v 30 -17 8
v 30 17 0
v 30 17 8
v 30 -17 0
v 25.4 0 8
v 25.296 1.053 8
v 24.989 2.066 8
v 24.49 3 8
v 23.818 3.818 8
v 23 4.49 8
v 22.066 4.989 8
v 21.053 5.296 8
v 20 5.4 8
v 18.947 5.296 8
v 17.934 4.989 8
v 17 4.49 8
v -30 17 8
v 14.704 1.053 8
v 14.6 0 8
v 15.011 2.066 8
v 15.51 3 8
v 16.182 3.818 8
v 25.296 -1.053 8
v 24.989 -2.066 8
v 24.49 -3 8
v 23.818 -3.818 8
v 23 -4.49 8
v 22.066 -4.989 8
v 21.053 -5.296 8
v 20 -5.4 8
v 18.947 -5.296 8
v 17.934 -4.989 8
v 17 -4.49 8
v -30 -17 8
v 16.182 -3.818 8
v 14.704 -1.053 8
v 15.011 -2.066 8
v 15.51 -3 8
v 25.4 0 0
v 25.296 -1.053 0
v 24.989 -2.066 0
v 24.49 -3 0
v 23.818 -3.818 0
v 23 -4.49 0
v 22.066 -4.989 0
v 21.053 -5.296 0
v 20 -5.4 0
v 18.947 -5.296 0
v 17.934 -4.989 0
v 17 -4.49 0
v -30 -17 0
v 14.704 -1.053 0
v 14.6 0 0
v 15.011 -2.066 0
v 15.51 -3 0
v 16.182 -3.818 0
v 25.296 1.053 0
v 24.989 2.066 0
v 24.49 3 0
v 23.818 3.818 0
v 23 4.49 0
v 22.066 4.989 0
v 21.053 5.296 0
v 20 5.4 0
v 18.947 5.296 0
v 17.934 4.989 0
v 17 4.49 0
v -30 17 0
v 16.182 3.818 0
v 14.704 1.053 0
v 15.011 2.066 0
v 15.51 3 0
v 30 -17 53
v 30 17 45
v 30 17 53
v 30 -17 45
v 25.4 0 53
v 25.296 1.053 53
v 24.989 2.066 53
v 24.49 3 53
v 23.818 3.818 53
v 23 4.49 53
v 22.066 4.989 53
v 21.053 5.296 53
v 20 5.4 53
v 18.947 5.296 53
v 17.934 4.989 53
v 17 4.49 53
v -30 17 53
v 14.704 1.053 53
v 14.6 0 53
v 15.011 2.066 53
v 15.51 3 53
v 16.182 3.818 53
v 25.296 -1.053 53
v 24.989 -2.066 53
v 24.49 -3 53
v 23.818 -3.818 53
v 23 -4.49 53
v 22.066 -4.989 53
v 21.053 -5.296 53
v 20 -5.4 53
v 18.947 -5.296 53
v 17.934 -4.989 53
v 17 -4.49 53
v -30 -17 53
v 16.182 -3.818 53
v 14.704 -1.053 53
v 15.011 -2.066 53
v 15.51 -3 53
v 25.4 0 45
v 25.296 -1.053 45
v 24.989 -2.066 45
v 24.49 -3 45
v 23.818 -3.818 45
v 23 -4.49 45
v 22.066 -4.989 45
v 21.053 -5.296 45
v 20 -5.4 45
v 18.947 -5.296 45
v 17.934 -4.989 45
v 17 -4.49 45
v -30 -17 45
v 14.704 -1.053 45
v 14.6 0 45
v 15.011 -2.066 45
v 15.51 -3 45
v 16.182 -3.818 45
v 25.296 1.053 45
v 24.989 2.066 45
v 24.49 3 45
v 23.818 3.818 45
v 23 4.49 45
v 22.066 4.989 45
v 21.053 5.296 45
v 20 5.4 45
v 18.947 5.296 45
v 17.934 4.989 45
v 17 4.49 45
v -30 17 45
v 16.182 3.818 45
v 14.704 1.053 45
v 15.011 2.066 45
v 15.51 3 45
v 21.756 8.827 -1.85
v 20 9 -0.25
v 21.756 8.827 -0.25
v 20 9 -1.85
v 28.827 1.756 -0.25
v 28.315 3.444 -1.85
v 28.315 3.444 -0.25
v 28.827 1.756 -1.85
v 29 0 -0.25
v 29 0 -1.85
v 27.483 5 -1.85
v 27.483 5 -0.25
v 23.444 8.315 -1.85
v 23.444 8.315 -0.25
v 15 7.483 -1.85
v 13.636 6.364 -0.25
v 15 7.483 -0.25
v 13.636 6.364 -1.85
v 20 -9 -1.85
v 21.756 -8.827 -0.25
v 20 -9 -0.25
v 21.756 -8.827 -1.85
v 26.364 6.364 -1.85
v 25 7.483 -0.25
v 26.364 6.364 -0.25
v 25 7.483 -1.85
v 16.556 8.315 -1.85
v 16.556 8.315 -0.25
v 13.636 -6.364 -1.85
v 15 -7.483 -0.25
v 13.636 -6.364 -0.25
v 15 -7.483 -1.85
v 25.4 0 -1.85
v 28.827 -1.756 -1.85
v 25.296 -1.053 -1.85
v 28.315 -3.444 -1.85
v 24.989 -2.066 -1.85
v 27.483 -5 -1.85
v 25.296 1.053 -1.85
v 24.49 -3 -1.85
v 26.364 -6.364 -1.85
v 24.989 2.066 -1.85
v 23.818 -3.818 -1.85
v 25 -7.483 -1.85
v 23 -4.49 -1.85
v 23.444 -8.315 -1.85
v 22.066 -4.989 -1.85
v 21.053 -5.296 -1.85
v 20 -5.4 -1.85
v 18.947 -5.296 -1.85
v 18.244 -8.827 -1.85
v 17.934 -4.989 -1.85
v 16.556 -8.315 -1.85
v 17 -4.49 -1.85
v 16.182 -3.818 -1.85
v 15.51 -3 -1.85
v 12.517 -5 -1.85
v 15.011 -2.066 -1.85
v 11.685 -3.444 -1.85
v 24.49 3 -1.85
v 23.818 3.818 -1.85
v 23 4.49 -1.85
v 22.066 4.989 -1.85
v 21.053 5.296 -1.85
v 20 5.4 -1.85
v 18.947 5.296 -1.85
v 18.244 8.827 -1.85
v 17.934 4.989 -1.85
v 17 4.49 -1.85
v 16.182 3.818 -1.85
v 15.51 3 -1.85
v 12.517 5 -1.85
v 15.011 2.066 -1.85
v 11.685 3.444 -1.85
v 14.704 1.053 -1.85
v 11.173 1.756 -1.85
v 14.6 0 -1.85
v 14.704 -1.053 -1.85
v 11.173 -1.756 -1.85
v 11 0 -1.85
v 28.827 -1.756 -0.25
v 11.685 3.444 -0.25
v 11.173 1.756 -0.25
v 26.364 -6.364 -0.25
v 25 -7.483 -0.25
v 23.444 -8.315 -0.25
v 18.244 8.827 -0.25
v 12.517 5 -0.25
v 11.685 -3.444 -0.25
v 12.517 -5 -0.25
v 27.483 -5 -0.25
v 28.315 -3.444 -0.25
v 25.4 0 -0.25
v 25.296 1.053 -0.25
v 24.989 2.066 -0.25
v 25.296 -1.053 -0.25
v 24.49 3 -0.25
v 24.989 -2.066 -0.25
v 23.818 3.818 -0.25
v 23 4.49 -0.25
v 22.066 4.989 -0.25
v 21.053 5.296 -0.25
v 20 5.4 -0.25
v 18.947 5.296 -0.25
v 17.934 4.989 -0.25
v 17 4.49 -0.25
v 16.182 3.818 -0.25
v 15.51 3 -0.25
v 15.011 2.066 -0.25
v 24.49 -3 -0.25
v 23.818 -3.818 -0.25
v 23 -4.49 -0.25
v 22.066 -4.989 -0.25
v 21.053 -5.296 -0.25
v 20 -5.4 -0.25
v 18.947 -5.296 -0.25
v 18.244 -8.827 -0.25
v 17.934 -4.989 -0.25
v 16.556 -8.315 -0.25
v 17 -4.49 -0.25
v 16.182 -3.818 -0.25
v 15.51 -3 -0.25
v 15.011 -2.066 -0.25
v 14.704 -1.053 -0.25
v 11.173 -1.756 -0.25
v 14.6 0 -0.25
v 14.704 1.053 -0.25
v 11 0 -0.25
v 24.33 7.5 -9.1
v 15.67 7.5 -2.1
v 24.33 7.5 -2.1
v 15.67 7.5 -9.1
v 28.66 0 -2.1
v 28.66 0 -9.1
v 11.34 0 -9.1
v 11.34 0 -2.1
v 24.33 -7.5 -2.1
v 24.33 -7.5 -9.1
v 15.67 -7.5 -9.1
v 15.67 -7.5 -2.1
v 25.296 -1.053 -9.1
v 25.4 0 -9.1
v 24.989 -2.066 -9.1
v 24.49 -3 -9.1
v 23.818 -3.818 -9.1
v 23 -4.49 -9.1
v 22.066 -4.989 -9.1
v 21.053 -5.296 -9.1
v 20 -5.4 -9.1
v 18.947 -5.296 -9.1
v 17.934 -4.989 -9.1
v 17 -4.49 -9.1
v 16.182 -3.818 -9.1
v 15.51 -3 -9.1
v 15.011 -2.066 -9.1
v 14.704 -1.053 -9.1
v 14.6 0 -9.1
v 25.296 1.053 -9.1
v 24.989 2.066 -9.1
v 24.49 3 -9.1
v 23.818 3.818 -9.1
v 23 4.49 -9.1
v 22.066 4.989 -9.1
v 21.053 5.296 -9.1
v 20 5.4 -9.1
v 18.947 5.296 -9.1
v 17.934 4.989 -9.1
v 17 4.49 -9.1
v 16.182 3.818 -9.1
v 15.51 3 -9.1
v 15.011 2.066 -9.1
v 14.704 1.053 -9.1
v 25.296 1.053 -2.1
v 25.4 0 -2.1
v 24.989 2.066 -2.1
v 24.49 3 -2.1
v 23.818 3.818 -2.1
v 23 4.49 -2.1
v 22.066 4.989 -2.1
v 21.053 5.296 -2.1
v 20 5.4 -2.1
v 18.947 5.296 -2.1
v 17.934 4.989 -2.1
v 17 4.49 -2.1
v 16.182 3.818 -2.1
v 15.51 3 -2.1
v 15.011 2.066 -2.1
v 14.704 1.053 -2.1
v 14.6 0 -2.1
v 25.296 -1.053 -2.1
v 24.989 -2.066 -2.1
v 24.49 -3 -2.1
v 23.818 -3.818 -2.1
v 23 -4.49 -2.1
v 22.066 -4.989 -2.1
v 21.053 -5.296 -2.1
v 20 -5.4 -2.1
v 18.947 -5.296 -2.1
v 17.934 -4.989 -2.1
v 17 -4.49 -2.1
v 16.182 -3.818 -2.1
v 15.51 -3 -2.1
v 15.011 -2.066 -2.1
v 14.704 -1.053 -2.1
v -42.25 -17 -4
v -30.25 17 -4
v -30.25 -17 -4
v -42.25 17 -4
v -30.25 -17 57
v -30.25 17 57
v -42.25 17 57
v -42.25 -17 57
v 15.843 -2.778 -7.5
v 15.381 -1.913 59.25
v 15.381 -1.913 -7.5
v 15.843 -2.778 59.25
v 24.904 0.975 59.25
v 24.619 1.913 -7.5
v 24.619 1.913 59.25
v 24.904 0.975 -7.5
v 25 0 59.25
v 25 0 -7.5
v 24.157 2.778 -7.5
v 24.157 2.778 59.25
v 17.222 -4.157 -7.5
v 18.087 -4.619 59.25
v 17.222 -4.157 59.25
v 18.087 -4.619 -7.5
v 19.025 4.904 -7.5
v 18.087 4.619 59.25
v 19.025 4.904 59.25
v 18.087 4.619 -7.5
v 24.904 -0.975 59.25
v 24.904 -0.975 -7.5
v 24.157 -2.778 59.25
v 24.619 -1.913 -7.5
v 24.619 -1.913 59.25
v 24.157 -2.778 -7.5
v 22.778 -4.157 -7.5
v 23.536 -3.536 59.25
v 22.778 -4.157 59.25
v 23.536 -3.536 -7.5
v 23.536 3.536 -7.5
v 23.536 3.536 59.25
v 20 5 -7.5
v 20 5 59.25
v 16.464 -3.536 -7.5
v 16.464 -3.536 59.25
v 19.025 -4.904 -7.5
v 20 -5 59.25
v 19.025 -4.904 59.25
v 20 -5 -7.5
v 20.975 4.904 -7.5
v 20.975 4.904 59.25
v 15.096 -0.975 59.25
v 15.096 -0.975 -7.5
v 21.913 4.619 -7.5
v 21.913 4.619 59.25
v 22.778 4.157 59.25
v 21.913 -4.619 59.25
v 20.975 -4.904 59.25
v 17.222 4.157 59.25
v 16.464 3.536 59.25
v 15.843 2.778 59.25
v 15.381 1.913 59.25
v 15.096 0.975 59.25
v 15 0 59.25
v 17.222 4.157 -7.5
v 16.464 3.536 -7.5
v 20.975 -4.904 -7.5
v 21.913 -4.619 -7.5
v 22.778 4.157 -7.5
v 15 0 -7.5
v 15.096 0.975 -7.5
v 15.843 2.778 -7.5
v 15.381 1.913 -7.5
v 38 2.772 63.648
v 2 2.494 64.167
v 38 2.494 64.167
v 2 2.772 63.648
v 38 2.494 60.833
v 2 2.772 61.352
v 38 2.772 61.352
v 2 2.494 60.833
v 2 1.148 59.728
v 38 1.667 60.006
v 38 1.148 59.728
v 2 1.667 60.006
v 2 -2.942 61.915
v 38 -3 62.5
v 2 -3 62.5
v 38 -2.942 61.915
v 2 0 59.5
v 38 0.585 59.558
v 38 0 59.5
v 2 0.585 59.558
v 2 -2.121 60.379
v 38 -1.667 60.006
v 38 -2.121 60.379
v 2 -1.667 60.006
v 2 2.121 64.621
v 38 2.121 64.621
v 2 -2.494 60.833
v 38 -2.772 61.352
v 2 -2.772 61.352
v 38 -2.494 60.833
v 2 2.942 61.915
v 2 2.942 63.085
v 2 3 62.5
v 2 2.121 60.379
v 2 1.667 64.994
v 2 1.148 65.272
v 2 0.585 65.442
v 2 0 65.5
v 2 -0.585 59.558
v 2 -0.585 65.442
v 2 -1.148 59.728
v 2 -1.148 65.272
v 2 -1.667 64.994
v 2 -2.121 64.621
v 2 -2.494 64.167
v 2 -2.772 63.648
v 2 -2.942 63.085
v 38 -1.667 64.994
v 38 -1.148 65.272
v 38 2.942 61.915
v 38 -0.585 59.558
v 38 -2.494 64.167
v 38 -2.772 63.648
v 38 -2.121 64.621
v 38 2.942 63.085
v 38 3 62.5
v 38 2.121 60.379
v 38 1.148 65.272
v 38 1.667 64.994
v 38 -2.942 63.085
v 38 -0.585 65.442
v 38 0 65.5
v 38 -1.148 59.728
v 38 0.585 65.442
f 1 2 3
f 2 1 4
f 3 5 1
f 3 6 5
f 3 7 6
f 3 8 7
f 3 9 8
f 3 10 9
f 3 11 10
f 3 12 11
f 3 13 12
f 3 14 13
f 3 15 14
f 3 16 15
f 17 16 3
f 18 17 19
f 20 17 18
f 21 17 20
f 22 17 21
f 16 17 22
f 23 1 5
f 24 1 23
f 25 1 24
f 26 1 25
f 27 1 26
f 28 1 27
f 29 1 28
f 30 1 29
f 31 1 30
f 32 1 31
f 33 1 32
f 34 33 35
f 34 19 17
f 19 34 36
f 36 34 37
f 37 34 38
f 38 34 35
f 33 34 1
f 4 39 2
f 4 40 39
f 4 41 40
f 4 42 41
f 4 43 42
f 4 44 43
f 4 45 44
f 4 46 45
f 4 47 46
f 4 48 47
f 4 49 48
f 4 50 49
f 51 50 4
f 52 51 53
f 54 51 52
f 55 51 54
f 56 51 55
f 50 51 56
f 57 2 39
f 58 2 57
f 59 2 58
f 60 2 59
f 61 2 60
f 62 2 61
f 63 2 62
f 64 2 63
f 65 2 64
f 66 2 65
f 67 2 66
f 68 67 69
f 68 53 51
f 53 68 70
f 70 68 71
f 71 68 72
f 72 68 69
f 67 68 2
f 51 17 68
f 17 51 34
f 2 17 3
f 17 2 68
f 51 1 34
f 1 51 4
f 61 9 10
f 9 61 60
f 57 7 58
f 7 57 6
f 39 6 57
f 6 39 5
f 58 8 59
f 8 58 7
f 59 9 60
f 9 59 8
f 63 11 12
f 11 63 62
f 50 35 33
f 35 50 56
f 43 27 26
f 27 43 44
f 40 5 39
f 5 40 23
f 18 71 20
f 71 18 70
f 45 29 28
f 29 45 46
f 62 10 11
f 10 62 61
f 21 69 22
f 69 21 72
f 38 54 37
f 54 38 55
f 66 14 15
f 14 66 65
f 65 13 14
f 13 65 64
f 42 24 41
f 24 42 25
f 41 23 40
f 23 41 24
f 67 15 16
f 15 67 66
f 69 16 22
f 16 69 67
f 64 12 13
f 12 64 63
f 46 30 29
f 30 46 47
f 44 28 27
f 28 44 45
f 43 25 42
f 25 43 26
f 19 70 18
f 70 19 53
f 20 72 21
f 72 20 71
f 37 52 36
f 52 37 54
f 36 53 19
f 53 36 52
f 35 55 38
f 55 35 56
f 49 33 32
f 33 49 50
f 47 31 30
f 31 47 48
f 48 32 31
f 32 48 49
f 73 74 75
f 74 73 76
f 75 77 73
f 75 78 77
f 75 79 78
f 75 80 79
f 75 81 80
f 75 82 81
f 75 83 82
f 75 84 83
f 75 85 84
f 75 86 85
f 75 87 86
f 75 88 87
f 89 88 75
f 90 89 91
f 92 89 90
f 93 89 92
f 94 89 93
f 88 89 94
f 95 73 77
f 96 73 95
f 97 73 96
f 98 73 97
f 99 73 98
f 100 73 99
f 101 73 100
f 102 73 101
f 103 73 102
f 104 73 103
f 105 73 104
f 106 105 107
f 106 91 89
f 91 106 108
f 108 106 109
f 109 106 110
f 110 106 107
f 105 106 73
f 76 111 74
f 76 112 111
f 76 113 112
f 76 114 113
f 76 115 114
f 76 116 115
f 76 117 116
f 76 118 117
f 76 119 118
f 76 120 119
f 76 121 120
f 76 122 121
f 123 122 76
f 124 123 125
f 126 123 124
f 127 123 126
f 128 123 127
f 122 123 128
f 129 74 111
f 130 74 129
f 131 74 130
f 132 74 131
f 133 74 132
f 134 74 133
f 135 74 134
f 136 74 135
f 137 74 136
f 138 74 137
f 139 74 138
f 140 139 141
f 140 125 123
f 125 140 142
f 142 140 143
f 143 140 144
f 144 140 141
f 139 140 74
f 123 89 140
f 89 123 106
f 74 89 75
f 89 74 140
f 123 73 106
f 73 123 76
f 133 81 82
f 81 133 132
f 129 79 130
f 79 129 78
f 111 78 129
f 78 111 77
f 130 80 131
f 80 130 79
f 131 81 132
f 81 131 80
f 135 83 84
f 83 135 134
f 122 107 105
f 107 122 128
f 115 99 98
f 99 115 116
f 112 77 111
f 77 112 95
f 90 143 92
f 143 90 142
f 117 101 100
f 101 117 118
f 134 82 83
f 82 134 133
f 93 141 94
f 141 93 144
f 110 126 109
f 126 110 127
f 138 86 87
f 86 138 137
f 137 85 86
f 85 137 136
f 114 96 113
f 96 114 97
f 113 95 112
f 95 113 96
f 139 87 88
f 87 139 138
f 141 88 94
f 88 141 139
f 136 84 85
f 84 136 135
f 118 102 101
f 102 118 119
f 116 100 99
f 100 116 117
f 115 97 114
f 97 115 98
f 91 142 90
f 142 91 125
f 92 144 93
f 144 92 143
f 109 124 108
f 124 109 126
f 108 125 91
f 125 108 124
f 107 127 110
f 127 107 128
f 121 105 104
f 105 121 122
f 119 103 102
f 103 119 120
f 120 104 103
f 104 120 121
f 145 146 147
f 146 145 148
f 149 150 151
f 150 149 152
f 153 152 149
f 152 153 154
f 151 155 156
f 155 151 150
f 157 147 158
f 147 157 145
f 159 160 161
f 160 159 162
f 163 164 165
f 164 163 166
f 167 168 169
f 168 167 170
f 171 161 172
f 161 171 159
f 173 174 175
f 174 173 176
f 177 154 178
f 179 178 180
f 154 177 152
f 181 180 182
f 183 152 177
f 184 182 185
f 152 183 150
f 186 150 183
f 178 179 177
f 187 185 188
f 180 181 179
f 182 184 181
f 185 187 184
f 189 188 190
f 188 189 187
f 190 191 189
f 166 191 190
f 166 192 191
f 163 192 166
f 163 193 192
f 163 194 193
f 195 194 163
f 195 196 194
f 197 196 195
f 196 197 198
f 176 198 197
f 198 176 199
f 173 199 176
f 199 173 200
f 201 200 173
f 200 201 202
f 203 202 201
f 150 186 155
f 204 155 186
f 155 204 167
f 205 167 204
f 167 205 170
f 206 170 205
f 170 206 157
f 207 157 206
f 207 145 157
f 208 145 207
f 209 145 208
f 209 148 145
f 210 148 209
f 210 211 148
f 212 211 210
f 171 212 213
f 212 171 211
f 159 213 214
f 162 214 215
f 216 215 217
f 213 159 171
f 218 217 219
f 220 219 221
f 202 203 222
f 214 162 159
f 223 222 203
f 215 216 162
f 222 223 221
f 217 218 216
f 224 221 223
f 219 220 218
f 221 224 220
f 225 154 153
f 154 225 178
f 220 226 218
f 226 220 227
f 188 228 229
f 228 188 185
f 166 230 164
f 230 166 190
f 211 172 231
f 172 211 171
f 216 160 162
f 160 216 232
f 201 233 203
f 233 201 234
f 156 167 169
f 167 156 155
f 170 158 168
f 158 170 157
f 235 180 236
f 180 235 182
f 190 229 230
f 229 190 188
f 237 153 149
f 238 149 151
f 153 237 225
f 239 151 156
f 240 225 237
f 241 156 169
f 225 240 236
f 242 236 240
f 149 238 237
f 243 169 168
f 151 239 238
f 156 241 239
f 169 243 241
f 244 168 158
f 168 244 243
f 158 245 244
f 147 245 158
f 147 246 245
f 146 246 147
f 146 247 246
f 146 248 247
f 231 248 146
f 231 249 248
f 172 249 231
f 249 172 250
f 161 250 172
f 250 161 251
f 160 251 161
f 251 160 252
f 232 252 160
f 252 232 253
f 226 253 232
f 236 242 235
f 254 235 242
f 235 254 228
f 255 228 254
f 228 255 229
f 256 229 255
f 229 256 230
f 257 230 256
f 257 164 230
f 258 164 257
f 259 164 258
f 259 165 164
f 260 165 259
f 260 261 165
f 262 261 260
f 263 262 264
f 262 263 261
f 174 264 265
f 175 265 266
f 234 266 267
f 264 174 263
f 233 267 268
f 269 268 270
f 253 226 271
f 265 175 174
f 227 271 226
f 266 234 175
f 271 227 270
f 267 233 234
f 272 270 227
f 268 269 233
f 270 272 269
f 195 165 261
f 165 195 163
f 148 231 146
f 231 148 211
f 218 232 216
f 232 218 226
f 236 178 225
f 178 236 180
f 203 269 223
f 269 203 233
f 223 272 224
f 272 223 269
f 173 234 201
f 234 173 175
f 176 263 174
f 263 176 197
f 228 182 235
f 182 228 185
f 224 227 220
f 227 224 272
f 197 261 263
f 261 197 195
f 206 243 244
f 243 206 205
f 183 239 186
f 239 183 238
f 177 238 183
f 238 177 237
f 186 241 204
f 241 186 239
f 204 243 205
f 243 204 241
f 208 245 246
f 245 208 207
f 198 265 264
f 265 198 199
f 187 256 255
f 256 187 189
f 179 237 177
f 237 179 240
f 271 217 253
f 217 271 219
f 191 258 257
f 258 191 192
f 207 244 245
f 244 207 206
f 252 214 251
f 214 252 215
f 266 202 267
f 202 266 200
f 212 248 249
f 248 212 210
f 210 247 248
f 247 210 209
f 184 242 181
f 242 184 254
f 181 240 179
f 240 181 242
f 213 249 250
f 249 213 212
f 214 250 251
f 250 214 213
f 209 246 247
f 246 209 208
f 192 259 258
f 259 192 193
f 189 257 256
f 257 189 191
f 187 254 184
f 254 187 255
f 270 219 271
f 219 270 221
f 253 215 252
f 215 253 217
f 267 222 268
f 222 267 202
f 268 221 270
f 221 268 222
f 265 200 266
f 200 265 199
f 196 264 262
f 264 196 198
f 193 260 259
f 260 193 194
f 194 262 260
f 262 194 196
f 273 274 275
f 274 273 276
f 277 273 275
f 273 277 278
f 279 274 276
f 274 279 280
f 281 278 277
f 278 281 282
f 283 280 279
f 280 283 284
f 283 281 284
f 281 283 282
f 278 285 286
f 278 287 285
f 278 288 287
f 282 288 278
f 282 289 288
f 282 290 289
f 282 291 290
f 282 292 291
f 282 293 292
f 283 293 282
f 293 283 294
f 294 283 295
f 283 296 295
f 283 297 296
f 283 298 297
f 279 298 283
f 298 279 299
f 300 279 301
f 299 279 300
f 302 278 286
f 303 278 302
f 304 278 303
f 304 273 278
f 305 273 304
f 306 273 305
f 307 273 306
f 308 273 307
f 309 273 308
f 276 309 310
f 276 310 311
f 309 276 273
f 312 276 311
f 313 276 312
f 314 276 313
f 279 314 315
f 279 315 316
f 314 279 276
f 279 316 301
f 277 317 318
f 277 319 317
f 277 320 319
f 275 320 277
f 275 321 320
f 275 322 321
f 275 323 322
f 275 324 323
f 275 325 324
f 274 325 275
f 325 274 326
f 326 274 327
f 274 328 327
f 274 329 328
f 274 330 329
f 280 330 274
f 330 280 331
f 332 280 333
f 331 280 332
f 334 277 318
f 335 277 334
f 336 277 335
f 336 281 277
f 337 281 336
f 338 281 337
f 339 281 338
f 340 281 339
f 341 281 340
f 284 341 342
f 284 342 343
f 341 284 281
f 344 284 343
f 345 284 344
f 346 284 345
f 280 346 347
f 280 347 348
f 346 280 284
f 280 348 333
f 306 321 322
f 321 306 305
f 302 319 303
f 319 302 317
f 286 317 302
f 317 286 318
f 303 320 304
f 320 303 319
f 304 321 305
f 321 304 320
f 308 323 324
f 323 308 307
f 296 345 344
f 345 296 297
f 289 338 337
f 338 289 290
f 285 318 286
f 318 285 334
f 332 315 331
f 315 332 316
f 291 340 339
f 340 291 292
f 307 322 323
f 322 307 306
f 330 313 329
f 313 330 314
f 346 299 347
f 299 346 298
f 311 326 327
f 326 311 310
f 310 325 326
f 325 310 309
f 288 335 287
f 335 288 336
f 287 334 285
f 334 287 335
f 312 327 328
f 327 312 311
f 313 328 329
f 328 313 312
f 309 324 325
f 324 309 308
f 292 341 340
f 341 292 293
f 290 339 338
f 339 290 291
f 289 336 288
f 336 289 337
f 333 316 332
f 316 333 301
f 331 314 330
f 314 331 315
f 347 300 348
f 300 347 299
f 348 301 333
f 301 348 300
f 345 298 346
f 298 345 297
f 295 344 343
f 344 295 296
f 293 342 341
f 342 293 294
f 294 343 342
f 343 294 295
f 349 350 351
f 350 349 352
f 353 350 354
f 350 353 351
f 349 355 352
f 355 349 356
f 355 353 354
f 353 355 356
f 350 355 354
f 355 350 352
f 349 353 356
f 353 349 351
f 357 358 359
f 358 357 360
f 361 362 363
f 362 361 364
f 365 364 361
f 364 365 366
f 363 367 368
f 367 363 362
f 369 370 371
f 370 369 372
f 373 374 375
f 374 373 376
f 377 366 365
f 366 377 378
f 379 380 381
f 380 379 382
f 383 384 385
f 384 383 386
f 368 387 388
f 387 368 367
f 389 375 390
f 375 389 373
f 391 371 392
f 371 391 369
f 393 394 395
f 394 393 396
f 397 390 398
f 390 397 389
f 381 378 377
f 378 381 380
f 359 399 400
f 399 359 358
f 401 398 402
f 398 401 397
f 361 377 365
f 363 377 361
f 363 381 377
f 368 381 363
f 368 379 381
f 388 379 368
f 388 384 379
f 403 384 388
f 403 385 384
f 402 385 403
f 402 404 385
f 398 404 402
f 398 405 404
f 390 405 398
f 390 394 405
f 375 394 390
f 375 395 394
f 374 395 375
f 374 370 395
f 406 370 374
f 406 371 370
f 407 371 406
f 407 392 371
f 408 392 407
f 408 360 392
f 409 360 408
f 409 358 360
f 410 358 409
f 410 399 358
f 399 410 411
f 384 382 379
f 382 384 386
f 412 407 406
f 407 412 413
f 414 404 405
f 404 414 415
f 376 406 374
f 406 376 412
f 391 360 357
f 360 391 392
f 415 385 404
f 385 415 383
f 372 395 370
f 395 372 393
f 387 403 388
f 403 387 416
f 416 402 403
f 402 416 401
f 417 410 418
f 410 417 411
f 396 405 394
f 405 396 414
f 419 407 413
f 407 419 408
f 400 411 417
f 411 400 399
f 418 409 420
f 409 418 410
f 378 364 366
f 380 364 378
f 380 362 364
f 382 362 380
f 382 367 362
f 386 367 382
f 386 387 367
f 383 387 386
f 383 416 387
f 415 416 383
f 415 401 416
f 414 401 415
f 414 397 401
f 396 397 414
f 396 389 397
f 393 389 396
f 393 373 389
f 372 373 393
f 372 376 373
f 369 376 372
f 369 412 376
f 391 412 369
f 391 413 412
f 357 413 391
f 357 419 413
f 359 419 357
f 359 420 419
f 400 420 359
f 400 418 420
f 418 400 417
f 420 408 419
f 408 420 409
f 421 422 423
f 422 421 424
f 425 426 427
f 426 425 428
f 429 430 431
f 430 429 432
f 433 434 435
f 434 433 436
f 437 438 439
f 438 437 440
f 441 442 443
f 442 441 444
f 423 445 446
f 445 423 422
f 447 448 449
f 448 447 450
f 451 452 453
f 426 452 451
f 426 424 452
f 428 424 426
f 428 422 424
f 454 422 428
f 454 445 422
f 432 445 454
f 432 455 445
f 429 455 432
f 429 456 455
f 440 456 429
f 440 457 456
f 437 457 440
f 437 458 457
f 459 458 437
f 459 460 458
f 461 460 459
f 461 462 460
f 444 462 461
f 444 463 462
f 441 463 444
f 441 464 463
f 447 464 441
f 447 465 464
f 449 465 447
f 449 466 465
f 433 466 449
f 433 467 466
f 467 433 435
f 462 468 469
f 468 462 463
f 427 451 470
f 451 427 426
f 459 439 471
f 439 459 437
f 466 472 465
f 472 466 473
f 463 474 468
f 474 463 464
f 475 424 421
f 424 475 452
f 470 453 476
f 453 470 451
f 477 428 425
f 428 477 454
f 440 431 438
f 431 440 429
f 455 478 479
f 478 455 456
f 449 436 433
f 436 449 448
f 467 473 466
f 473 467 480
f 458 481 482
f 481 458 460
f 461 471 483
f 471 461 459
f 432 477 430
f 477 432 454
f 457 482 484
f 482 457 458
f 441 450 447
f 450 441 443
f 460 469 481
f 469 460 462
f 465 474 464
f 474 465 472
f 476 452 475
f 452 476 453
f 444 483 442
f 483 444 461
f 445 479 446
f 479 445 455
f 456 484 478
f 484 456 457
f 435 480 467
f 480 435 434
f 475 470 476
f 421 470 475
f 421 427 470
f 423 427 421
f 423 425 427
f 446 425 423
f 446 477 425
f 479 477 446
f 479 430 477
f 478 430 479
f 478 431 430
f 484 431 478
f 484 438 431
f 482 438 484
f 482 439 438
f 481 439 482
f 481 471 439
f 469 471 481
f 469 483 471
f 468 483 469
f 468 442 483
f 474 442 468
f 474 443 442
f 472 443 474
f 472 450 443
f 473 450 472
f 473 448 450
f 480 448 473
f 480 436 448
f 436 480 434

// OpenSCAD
$fn = 32;

// ------------------------------------------------------------------------
// C clamp: throat 45 mm, screw d10
// Every part is its own module, assembly() places every instance.
// ------------------------------------------------------------------------

// --- part 1 ---
module clamp_arm() {
  difference() {
    translate([-30, -17, 0]) cube([60, 34, 8]);
    translate([20, 0, -1]) cylinder(h = 10, d = 10.8);
  }
}

// --- part 2 ---
module clamp_spine() {
  difference() {
    translate([-30.5, -17, 0]) cube([61, 34, 12]);
  }
}

// --- part 3 ---
module clamp_screw() {
  translate([0, 0, -33.375]) cylinder(h = 66.75, d = 10);
}

// --- part 4 ---
module clamp_washer() {
  difference() {
      translate([0, 0, 0]) cylinder(h = 1.6, d = 18);
      translate([0, 0, -1]) cylinder(h = 3.6, d = 10.8);
    }
}

// --- part 5 ---
module clamp_nut() {
  difference() {
    linear_extrude(height = 7) polygon(points = [[8.66, 0], [4.33, 7.5], [-4.33, 7.5], [-8.66, 0], [-4.33, -7.5], [4.33, -7.5]]);
    translate([0, 0, -1]) cylinder(h = 9, d = 10.8);
  }
}

// --- part 6 ---
module tommy_bar() {
  translate([0, 0, -18]) cylinder(h = 36, d = 6);
}

// --- assembly ---
module assembly() {
  color([0.80, 0.24, 0.20]) translate([0, 0, 0]) rotate([0, 0, 0]) clamp_arm();
  color([0.20, 0.45, 0.75]) translate([0, 0, 45]) rotate([0, 0, 0]) clamp_arm();
  color([0.25, 0.62, 0.32]) translate([-42.25, 0, 26.5]) rotate([0, 90, 0]) clamp_spine();
  color([0.92, 0.70, 0.18]) translate([20, 0, 25.875]) rotate([0, 0, 0]) clamp_screw();
  color([0.58, 0.35, 0.70]) translate([20, 0, -1.85]) rotate([0, 0, 0]) clamp_washer();
  color([0.16, 0.66, 0.66]) translate([20, 0, -9.1]) rotate([0, 0, 0]) clamp_nut();
  color([0.85, 0.48, 0.18]) translate([20, 0, 62.5]) rotate([0, 90, 0]) tommy_bar();
}

assembly();
